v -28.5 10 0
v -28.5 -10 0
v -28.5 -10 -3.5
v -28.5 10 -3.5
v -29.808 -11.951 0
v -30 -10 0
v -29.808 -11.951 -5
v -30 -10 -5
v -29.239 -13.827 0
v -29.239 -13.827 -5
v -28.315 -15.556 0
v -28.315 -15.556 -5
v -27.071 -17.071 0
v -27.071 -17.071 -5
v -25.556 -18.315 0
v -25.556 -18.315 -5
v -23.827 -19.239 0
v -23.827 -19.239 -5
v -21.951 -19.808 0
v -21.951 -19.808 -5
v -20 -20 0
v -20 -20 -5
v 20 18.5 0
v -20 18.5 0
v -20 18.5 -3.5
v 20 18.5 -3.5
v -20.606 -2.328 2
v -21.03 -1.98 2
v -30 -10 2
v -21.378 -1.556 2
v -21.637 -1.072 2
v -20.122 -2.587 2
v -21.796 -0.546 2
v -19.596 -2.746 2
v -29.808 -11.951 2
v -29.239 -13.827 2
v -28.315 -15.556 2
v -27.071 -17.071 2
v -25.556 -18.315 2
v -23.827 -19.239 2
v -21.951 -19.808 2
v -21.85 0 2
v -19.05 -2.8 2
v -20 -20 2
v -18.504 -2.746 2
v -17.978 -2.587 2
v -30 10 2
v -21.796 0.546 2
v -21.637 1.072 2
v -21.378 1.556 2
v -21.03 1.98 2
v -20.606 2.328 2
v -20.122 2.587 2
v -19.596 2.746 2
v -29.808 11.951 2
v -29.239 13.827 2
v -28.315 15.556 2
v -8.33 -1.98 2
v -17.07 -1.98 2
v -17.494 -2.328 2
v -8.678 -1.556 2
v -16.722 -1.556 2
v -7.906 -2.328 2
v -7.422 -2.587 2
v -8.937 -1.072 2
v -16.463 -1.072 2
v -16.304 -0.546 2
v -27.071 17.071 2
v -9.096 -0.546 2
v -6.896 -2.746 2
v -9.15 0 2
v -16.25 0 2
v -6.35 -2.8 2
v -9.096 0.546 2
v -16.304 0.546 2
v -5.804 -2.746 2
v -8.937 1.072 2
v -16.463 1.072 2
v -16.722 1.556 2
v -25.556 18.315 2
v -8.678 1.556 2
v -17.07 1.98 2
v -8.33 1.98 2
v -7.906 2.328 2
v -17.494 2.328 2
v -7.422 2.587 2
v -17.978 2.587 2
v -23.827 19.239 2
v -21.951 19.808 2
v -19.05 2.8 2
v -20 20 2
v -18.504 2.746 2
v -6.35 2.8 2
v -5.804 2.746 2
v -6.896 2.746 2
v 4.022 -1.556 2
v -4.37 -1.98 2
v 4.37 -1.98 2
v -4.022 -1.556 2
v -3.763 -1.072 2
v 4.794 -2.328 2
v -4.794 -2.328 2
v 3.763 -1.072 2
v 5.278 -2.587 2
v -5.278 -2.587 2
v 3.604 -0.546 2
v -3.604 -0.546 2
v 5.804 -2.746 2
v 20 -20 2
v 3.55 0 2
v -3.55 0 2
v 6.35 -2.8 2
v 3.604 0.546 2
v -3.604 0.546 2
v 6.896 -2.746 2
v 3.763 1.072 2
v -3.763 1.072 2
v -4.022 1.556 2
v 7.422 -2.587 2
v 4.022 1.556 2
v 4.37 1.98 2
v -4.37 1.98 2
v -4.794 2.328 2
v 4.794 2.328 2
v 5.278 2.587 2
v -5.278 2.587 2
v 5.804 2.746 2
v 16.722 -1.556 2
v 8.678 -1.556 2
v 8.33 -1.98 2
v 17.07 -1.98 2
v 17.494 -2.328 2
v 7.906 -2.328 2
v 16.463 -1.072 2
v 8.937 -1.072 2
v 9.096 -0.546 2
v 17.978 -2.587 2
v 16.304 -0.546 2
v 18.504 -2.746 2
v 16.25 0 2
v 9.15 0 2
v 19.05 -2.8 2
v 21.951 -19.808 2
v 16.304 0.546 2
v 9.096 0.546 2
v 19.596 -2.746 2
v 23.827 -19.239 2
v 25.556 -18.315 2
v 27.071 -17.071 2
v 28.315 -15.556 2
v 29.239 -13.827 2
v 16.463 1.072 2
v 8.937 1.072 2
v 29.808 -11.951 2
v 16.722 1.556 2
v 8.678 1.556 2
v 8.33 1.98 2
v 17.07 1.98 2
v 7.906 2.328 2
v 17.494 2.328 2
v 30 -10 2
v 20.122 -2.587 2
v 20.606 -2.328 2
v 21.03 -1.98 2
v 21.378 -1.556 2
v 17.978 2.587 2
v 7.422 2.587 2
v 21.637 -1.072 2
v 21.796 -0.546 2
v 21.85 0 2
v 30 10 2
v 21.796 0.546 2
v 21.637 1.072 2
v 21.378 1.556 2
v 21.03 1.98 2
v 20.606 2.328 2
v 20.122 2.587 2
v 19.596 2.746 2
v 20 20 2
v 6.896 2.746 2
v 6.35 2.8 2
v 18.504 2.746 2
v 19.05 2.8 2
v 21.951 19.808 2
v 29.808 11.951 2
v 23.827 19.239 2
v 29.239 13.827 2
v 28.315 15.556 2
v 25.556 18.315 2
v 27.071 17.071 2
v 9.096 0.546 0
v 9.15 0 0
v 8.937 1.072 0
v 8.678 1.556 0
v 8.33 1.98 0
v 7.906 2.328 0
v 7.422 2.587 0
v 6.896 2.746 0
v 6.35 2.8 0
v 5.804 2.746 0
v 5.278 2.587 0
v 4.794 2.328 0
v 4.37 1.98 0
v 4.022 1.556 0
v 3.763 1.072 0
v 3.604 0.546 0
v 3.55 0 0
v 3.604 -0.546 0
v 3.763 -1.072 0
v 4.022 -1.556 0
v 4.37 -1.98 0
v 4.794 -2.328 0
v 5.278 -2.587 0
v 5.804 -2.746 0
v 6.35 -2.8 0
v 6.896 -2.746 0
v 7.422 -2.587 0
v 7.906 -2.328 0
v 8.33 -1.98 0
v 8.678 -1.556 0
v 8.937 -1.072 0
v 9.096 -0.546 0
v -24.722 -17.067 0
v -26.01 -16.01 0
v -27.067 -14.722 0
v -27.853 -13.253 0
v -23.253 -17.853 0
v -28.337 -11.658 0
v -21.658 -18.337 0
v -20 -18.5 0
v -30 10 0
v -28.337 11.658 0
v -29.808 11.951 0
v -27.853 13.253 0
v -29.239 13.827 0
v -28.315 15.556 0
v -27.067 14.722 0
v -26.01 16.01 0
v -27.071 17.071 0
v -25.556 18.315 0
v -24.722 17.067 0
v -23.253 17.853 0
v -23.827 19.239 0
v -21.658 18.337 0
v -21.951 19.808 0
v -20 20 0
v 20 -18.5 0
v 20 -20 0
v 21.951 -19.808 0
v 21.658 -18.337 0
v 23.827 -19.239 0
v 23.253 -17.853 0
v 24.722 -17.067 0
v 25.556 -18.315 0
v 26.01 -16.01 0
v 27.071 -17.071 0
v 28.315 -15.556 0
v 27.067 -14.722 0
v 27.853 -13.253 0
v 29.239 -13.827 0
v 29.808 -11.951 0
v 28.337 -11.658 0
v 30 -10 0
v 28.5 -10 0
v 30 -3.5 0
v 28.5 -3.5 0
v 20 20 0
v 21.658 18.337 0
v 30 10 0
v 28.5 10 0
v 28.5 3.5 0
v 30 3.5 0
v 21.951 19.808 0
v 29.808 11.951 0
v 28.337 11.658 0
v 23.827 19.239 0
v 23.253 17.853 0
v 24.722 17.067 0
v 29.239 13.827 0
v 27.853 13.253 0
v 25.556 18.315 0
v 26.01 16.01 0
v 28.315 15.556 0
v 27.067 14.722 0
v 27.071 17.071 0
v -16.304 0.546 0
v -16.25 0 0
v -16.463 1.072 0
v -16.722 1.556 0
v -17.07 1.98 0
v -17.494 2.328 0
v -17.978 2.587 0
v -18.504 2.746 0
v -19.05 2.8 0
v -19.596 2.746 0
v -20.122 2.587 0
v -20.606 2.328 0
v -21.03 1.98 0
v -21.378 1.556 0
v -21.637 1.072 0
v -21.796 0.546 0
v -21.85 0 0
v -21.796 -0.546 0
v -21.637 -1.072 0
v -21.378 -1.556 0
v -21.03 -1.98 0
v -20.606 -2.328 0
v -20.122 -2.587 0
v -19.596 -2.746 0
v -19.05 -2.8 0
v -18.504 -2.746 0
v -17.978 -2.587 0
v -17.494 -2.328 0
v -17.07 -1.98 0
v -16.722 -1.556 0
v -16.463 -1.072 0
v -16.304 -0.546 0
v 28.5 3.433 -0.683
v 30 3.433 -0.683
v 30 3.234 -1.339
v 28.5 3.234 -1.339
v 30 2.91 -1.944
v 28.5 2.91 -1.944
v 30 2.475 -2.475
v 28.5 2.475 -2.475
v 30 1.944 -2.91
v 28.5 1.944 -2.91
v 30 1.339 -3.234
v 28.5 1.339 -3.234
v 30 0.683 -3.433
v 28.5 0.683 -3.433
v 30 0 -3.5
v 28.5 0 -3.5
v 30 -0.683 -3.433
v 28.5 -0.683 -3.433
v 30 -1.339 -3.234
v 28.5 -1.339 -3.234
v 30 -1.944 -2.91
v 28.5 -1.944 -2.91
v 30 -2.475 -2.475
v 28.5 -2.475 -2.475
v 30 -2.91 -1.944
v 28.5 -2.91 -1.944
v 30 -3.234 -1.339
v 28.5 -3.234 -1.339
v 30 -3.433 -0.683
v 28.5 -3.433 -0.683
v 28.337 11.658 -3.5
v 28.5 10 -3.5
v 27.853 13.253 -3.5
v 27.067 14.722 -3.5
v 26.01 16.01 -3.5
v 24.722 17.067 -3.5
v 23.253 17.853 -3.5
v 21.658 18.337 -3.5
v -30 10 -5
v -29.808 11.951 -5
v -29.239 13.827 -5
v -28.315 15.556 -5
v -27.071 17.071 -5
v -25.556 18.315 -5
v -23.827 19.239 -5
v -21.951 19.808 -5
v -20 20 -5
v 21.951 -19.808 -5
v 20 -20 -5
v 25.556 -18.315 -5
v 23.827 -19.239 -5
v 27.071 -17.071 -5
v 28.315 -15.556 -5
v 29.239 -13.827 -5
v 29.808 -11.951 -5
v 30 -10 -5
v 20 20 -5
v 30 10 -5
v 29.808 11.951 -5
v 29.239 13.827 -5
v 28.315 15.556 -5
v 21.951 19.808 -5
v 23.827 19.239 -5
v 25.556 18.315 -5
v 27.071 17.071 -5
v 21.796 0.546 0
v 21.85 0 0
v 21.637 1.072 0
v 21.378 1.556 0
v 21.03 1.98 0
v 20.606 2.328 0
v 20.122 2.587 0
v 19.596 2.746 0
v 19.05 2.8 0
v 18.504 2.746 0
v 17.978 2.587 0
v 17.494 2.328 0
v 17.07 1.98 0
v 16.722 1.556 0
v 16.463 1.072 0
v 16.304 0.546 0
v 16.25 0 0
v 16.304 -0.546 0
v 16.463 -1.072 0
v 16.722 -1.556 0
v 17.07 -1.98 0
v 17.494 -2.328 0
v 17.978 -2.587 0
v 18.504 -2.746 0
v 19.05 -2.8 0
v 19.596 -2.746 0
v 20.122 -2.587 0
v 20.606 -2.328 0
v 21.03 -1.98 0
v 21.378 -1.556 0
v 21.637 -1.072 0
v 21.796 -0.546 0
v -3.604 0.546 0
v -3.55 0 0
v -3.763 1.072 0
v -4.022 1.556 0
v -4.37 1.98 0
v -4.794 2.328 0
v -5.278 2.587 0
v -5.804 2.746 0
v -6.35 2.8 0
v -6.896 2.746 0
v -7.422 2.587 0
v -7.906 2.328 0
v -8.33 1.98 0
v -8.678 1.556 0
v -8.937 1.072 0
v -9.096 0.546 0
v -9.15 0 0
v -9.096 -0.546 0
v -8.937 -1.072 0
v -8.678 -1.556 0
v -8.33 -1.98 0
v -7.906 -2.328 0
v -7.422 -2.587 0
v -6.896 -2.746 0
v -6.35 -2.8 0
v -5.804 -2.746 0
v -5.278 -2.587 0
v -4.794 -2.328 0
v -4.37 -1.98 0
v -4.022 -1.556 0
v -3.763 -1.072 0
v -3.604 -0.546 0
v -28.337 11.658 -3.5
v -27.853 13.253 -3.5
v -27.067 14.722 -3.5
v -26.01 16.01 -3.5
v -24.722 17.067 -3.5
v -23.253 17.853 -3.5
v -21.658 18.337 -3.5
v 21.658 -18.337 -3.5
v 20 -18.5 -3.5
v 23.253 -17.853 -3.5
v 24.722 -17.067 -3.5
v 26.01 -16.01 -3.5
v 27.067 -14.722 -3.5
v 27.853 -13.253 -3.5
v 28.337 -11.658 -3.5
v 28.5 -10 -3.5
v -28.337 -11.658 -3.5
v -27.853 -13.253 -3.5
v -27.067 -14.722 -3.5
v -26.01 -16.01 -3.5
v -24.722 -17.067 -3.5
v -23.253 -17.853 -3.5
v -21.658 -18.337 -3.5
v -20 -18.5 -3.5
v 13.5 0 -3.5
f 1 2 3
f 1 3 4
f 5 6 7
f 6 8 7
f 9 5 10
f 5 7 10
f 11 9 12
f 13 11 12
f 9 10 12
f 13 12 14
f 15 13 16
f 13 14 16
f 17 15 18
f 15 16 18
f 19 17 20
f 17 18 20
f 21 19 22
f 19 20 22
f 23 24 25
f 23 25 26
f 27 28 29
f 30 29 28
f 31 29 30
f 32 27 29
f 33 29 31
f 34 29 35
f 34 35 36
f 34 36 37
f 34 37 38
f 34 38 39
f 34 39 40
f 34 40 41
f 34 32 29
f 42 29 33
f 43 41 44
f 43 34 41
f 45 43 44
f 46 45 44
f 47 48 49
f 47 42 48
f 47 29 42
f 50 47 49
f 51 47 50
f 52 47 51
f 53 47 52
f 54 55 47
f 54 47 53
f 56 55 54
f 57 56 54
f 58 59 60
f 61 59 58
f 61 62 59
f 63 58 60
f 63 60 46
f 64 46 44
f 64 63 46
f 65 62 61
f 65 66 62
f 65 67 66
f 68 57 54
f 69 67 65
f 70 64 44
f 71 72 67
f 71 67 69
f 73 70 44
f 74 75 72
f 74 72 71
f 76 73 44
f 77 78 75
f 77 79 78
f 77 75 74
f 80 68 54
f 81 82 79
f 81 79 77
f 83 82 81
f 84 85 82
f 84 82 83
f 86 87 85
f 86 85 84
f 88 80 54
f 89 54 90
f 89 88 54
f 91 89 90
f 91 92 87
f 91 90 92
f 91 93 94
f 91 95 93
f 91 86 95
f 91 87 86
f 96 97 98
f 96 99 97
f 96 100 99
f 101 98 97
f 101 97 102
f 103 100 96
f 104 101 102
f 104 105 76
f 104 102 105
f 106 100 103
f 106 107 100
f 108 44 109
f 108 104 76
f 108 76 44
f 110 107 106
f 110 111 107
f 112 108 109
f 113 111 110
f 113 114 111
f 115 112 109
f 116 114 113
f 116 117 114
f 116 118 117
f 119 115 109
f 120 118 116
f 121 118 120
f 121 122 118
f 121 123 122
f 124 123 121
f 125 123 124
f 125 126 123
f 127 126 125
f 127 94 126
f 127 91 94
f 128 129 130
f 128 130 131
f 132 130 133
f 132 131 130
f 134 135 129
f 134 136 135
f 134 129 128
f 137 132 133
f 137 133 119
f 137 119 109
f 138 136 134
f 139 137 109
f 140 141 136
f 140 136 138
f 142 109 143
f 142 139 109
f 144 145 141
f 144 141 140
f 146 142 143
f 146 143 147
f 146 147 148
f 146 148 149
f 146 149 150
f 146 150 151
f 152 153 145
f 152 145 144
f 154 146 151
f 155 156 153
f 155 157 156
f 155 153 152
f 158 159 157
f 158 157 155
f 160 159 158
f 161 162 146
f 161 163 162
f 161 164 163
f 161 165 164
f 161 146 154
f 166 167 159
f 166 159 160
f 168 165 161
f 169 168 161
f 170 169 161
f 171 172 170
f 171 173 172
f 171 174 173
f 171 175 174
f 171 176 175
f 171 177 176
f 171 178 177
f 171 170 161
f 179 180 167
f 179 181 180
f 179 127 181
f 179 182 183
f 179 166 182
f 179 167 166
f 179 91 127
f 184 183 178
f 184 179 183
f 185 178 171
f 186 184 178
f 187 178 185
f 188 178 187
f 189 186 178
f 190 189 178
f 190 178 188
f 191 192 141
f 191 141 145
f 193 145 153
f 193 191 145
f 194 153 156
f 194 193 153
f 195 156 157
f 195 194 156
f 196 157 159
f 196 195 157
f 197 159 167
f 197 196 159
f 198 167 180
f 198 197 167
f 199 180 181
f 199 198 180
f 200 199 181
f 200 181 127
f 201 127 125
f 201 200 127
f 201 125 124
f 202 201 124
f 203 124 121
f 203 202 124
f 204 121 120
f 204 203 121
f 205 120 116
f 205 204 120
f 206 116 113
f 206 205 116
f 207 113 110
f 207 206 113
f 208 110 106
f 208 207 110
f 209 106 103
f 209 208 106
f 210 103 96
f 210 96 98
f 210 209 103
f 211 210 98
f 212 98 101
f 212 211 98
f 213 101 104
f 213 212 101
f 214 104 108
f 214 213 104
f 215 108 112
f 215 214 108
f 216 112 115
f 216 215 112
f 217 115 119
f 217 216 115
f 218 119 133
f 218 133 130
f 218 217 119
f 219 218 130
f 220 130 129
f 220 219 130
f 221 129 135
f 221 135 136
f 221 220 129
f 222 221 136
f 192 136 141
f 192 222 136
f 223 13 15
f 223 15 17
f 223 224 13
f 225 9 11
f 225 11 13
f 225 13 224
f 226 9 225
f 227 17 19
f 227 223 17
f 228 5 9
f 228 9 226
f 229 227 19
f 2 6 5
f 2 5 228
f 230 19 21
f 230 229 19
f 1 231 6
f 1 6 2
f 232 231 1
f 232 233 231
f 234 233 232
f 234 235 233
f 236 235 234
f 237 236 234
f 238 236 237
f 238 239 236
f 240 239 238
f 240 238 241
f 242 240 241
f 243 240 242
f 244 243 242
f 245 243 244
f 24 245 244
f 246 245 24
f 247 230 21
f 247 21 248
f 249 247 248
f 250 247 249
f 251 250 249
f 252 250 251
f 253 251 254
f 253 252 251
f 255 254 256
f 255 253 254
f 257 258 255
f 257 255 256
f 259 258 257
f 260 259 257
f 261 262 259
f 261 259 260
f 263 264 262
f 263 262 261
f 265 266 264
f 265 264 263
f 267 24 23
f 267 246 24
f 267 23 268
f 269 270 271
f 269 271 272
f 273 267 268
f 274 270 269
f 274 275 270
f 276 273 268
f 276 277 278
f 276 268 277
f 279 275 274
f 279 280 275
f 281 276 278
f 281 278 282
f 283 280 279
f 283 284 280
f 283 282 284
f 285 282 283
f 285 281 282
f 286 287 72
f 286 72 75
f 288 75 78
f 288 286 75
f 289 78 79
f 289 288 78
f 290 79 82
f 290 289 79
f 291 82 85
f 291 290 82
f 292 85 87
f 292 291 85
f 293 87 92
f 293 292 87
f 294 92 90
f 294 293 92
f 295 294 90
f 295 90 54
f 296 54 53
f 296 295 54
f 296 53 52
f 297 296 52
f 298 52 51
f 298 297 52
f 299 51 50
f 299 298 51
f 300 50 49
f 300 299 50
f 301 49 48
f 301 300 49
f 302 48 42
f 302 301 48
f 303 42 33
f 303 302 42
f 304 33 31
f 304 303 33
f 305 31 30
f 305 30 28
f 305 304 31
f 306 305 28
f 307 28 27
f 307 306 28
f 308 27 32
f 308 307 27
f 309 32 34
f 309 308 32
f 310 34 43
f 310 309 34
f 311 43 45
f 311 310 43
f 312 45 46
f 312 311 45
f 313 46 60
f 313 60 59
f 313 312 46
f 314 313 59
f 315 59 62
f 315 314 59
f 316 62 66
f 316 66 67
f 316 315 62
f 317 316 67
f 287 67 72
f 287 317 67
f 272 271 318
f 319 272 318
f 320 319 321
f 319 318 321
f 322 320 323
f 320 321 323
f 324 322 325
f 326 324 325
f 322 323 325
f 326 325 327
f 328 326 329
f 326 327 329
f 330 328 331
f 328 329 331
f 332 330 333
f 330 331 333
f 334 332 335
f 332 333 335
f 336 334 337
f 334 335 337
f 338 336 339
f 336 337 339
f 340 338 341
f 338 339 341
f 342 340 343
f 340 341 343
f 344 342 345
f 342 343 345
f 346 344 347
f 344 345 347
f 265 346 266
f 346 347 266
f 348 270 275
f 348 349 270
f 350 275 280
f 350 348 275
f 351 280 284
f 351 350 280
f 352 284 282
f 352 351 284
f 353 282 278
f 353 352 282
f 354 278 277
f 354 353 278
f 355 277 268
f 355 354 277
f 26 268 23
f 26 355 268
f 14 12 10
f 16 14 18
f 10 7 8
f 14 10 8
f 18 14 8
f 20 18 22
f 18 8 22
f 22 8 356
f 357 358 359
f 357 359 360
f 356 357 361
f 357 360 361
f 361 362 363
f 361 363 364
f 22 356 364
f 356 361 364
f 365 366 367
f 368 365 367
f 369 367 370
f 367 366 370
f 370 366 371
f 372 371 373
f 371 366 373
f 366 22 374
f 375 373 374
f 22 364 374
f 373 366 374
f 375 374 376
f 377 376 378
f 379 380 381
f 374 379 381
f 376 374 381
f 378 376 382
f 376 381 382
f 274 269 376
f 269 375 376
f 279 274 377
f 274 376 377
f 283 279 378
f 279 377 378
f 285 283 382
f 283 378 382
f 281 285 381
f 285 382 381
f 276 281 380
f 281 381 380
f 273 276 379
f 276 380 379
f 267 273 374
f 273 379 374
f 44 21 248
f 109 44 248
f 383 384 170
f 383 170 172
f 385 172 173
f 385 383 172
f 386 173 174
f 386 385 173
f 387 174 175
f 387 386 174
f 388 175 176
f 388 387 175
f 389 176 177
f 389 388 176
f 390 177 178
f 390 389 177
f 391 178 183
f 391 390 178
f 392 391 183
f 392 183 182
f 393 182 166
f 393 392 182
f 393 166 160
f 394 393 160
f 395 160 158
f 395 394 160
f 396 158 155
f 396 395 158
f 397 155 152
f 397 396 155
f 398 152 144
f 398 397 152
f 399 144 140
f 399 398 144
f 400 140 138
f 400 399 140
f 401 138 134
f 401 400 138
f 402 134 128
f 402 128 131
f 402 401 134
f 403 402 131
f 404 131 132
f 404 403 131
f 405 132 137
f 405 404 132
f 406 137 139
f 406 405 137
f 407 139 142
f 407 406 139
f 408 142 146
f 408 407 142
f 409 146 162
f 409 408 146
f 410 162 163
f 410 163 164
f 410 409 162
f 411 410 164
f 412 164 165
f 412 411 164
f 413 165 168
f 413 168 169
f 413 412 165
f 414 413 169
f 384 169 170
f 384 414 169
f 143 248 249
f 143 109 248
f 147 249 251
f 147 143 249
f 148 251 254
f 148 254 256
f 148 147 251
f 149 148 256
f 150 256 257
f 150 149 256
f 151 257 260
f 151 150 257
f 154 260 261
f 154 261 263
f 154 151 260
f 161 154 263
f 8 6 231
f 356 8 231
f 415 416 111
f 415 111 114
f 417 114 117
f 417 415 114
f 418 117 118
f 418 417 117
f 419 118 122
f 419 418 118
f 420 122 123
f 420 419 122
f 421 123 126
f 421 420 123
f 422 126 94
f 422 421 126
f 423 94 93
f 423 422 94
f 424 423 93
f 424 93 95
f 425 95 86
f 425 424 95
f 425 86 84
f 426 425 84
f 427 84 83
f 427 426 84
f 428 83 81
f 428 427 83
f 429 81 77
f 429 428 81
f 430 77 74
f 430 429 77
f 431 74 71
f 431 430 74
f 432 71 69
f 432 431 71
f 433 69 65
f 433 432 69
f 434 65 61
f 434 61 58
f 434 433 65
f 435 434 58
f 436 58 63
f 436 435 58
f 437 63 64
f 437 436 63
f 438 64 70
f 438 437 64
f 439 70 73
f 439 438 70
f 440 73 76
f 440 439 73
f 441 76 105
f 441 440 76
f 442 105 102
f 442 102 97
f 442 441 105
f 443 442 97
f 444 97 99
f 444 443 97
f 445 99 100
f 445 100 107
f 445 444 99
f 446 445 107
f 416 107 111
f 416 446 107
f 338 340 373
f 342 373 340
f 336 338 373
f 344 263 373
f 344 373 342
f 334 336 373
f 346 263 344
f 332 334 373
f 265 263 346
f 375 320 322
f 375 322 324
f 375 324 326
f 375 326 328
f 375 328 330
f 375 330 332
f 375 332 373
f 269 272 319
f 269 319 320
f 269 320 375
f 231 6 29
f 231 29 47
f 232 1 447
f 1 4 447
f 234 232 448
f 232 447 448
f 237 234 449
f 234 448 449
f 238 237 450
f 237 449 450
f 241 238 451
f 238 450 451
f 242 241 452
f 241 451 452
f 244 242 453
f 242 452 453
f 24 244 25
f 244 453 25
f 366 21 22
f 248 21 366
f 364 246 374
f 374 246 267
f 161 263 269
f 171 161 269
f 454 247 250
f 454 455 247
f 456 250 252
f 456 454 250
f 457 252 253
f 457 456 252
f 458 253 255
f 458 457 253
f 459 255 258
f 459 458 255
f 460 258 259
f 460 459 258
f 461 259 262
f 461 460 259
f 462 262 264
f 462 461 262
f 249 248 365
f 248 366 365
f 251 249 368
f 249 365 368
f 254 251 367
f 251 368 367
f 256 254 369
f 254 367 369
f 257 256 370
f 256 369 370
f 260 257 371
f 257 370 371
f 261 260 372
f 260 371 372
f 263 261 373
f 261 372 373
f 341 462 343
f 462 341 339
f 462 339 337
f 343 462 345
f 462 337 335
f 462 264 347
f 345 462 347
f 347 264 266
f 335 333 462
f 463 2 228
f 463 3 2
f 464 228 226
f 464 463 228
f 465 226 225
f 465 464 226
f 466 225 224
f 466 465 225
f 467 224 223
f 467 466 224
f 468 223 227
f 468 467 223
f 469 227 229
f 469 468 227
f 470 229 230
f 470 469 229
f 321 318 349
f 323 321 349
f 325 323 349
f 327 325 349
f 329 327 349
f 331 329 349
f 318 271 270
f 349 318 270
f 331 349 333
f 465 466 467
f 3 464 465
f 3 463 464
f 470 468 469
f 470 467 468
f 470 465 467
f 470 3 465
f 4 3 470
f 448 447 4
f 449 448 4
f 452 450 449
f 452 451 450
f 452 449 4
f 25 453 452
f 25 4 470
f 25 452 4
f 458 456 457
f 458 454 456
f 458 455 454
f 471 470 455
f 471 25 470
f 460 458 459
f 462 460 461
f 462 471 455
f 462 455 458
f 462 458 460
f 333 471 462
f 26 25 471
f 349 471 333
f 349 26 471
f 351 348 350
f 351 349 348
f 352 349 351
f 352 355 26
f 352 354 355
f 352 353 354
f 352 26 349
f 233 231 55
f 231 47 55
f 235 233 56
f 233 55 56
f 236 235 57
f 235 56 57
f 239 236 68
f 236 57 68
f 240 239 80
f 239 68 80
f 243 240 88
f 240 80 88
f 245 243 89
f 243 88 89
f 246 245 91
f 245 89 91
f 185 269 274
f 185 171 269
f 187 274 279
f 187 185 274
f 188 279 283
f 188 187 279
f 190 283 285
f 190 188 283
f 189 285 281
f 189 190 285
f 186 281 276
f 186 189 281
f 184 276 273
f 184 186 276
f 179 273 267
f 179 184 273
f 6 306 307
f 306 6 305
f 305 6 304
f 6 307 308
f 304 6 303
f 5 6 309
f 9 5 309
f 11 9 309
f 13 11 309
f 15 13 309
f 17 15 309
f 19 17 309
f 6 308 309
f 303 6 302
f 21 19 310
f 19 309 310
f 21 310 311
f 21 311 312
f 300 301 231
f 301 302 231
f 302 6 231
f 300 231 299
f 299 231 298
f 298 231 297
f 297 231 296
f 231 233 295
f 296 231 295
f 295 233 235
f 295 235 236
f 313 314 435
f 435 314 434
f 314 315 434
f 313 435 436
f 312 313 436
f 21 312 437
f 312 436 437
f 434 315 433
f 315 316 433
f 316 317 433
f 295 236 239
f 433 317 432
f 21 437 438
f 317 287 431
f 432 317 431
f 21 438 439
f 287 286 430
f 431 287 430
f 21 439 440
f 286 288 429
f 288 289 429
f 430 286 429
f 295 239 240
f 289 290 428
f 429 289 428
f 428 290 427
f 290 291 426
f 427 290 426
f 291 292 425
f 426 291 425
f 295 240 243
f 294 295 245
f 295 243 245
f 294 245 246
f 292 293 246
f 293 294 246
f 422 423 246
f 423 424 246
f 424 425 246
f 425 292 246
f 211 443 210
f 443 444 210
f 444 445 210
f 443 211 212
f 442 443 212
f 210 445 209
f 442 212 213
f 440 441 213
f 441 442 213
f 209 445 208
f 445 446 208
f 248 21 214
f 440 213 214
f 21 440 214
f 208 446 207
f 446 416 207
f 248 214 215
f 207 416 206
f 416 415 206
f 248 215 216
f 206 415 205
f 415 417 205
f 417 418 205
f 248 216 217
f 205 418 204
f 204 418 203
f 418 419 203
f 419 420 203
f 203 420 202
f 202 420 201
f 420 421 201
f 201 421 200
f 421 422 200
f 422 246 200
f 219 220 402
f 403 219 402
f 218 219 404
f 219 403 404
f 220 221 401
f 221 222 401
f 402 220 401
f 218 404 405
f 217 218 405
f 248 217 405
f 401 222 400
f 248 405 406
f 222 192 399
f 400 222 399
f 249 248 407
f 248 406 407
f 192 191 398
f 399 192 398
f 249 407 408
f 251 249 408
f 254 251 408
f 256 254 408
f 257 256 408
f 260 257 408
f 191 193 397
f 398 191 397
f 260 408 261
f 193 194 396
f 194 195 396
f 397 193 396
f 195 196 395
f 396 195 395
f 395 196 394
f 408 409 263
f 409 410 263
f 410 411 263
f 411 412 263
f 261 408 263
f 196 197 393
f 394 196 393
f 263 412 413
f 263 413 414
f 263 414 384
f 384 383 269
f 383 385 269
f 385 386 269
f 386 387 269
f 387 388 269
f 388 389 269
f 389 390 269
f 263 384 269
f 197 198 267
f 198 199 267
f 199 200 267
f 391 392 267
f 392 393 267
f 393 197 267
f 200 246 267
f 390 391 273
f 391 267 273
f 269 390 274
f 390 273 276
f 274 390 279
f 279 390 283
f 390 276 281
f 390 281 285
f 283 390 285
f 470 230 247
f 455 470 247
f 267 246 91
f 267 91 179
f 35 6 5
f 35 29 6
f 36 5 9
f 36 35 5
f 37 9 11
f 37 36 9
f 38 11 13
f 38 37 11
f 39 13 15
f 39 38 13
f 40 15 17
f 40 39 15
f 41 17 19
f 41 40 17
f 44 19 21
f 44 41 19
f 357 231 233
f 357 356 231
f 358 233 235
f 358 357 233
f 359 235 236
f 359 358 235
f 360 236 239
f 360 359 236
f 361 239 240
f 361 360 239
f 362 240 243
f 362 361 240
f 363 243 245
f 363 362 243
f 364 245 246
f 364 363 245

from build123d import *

# Parameters (mm, degrees)
F0_W      = 60
F0_H      = 40
F0_R      = 2.8
F1_DEPTH  = 2
F2_R      = 10
F3_R      = 10
F4_R      = 10
F5_R      = 10
F6_W      = 60
F6_H      = 40
F7_DEPTH  = 5
F8_R      = 10
F9_T      = -1.5
F11_D     = 7
F11_DEPTH = 16.5
F11_TIP   = 2.1030121666


with BuildPart() as f1:
    # F0 (on Top) → F1 (new body)
    with BuildSketch(Plane.XY):
        Rectangle(F0_W, F0_H)
        with Locations((-19.05, 0)):
            Circle(F0_R, mode=Mode.SUBTRACT)
        with Locations((-6.35, 0)):
            Circle(F0_R, mode=Mode.SUBTRACT)
        with Locations((6.35, 0)):
            Circle(F0_R, mode=Mode.SUBTRACT)
        with Locations((19.05, 0)):
            Circle(F0_R, mode=Mode.SUBTRACT)
    extrude(amount=F1_DEPTH)

    # F2
    f2_edges = [f1.edges().sort_by_distance(p)[0] for p in [
        (-30, 20, 1),
    ]]
    fillet(f2_edges, radius=F2_R)

    # F3
    f3_edges = [f1.edges().sort_by_distance(p)[0] for p in [
        (-30, -20, 1),
    ]]
    fillet(f3_edges, radius=F3_R)

    # F4
    f4_edges = [f1.edges().sort_by_distance(p)[0] for p in [
        (30, -20, 1),
    ]]
    fillet(f4_edges, radius=F4_R)

    # F5
    f5_edges = [f1.edges().sort_by_distance(p)[0] for p in [
        (30, 20, 1),
    ]]
    fillet(f5_edges, radius=F5_R)


with BuildPart() as f7:
    # F6 (on Top) → F7 (new body)
    with BuildSketch(Plane.XY):
        Rectangle(F6_W, F6_H)
    extrude(amount=-F7_DEPTH)

    # F8
    f8_edges = [f7.edges().sort_by_distance(p)[0] for p in [
        (-30, -20, -2.5),
        (30, -20, -2.5),
        (30, 20, -2.5),
        (-30, 20, -2.5),
    ]]
    fillet(f8_edges, radius=F8_R)

    # F9
    f9_openings = [f7.faces().sort_by_distance(p)[0] for p in [
        (0, 0, 0),
    ]]
    offset(amount=F9_T, openings=f9_openings)

    # F11
    with Locations(Plane.YZ.offset(30)):
        with Locations((0, 0)):
            Hole(F11_D / 2, depth=F11_DEPTH)
            with Locations((0, 0, -(F11_DEPTH + F11_TIP / 2))):  # 118° drill point
                Cone(0, F11_D / 2, F11_TIP, mode=Mode.SUBTRACT)


solid = Compound([f1.part, f7.part])
